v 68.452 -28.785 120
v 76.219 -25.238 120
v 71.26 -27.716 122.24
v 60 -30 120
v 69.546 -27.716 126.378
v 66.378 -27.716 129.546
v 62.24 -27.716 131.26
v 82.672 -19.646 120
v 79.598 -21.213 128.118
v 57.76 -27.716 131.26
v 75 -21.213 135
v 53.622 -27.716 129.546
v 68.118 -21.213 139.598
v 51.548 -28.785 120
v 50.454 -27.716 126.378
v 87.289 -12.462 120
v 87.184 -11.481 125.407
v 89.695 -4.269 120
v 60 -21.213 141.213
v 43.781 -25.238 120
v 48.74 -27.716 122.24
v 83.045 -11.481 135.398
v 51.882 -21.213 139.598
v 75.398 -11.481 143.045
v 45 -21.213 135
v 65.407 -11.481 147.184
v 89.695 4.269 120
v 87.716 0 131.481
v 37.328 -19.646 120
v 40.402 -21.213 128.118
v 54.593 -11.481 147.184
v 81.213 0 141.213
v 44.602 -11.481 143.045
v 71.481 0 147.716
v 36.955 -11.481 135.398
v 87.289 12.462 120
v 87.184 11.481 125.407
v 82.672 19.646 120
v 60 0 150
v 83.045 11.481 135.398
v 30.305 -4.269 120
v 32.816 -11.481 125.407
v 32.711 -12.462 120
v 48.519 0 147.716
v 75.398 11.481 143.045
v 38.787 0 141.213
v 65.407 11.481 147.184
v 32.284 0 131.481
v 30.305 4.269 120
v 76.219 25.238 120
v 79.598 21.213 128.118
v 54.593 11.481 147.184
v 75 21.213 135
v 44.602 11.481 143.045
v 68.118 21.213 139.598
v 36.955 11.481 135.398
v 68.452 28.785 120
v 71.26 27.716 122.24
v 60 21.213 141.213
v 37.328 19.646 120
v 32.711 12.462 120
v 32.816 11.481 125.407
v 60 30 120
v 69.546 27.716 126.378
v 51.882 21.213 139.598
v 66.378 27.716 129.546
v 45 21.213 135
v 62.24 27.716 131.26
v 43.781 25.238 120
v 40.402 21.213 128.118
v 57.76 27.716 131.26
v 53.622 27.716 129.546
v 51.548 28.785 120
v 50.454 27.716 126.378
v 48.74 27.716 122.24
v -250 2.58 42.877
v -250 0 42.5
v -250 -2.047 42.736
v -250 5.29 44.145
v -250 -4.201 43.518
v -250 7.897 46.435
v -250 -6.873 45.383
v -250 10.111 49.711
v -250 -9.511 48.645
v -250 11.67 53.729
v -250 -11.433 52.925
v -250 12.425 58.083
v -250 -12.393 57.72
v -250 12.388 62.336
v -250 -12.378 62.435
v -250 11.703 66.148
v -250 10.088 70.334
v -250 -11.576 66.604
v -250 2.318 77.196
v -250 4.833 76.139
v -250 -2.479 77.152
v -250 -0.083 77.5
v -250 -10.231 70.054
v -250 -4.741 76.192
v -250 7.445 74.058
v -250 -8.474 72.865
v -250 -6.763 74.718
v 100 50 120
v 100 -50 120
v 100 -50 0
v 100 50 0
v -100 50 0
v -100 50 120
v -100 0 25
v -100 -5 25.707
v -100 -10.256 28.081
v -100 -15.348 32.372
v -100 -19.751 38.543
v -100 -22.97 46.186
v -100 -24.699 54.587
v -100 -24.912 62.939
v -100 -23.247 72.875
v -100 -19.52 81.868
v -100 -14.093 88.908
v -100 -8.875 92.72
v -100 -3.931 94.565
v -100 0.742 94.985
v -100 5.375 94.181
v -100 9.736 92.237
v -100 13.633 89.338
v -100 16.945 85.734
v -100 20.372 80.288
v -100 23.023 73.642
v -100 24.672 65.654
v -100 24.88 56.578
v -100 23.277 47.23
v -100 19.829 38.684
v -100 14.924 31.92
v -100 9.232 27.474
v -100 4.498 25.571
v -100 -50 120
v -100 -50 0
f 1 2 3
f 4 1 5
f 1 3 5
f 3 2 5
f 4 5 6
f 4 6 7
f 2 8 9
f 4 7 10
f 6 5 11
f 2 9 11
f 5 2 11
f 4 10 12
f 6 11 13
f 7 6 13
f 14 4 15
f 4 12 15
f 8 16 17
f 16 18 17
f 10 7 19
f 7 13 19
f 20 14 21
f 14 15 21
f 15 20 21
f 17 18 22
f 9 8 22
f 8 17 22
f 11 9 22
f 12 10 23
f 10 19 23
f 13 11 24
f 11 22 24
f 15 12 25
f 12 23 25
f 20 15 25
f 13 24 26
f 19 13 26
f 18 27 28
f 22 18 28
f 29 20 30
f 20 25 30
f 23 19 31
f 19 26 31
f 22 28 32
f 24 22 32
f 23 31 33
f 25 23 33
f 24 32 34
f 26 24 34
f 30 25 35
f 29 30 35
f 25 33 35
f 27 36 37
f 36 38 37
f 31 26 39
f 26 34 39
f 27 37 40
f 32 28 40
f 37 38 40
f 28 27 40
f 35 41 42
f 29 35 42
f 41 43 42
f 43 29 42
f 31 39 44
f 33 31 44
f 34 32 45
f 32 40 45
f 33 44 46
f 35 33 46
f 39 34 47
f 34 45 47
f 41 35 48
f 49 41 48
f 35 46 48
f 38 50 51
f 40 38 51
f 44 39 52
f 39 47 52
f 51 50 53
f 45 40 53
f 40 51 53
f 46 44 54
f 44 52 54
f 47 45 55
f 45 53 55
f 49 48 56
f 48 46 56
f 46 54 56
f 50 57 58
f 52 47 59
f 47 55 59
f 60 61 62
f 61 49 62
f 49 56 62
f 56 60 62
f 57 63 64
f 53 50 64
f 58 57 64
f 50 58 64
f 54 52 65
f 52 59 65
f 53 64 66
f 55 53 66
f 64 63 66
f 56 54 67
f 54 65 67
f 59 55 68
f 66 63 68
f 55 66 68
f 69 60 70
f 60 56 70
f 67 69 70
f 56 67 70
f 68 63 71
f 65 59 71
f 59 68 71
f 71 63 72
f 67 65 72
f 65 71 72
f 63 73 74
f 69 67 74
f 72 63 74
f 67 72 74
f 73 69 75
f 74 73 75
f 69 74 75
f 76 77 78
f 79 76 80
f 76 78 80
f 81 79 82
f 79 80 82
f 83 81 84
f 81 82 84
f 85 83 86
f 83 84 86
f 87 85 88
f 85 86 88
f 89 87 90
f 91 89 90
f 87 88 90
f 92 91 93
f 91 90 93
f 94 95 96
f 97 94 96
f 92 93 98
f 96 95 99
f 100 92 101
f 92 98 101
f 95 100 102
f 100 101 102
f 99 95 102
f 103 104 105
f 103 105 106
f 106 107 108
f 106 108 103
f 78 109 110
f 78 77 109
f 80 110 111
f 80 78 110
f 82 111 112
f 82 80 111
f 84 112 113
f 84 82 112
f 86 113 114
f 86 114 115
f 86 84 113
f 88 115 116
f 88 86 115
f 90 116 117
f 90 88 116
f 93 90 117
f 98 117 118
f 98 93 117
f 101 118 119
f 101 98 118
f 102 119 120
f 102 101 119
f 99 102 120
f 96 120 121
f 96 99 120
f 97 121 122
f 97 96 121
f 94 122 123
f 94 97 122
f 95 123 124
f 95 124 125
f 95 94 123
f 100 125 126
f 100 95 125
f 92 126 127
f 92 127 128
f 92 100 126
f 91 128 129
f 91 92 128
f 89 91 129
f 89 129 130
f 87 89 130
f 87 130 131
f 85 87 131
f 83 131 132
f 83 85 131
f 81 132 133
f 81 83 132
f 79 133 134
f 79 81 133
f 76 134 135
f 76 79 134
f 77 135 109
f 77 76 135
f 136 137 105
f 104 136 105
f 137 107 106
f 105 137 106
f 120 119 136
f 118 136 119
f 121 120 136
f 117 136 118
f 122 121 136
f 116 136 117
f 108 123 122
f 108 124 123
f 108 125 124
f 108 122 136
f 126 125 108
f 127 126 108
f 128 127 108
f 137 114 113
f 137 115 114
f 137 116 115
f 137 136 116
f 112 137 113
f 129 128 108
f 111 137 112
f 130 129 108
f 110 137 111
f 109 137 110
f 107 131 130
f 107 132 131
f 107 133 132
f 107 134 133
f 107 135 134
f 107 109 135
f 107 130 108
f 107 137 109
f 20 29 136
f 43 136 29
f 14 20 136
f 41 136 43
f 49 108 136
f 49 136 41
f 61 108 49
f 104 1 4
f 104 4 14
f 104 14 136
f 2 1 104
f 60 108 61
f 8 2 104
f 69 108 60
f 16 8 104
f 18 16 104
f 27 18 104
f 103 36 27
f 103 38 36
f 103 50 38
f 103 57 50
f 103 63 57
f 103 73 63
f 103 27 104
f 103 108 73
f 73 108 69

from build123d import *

# Parameters (mm, degrees)
F0_W     = 200
F0_H     = 100
F1_DEPTH = 120


with BuildPart() as f1:
    # F0 (on Top) → F1 (new body)
    with BuildSketch(Plane.XY):
        Rectangle(F0_W, F0_H)
    extrude(amount=F1_DEPTH)

    # F2 (on face) → F3 (revolve)
    with BuildSketch(Plane.XY.offset(120)):
        with BuildLine():
            Line((60, 30), (60, -30))
            ThreePointArc((60, -30), (90, 0), (60, 30))
        make_face()
    revolve(axis=Axis((60, 0, 120), (0, -1, 0)))

    # F4 (on face) → F7 section 0
    with BuildSketch(Plane(origin=(-100, 0, 0), x_dir=(0, -1, 0), z_dir=(-1, 0, 0))):
        with BuildLine():
            add(Edge.make_bspline(
                [(0, 25), (43.30127, 25), (21.650635, 77.5), (0, 130), (-21.650635, 77.5), (-43.30127, 25), (0, 25)],
                knots=[0, 0, 0, 2.094395, 2.094395, 4.18879, 4.18879, 6.283185, 6.283185, 6.283185], degree=2, weights=[1, 0.5, 1, 0.5, 1, 0.5, 1]))
        make_face()
    # F6 (on offset) → F7 section 1
    with BuildSketch(Plane.YZ.offset(-250)):
        with BuildLine():
            add(Edge.make_bspline(
                [(0, 42.5), (21.650635, 42.5), (10.825318, 68.75), (0, 95), (-10.825318, 68.75), (-21.650635, 42.5), (0, 42.5)],
                knots=[0, 0, 0, 2.094395, 2.094395, 4.18879, 4.18879, 6.283185, 6.283185, 6.283185], degree=2, weights=[1, 0.5, 1, 0.5, 1, 0.5, 1]))
        make_face()
    loft()


solid = f1.part
